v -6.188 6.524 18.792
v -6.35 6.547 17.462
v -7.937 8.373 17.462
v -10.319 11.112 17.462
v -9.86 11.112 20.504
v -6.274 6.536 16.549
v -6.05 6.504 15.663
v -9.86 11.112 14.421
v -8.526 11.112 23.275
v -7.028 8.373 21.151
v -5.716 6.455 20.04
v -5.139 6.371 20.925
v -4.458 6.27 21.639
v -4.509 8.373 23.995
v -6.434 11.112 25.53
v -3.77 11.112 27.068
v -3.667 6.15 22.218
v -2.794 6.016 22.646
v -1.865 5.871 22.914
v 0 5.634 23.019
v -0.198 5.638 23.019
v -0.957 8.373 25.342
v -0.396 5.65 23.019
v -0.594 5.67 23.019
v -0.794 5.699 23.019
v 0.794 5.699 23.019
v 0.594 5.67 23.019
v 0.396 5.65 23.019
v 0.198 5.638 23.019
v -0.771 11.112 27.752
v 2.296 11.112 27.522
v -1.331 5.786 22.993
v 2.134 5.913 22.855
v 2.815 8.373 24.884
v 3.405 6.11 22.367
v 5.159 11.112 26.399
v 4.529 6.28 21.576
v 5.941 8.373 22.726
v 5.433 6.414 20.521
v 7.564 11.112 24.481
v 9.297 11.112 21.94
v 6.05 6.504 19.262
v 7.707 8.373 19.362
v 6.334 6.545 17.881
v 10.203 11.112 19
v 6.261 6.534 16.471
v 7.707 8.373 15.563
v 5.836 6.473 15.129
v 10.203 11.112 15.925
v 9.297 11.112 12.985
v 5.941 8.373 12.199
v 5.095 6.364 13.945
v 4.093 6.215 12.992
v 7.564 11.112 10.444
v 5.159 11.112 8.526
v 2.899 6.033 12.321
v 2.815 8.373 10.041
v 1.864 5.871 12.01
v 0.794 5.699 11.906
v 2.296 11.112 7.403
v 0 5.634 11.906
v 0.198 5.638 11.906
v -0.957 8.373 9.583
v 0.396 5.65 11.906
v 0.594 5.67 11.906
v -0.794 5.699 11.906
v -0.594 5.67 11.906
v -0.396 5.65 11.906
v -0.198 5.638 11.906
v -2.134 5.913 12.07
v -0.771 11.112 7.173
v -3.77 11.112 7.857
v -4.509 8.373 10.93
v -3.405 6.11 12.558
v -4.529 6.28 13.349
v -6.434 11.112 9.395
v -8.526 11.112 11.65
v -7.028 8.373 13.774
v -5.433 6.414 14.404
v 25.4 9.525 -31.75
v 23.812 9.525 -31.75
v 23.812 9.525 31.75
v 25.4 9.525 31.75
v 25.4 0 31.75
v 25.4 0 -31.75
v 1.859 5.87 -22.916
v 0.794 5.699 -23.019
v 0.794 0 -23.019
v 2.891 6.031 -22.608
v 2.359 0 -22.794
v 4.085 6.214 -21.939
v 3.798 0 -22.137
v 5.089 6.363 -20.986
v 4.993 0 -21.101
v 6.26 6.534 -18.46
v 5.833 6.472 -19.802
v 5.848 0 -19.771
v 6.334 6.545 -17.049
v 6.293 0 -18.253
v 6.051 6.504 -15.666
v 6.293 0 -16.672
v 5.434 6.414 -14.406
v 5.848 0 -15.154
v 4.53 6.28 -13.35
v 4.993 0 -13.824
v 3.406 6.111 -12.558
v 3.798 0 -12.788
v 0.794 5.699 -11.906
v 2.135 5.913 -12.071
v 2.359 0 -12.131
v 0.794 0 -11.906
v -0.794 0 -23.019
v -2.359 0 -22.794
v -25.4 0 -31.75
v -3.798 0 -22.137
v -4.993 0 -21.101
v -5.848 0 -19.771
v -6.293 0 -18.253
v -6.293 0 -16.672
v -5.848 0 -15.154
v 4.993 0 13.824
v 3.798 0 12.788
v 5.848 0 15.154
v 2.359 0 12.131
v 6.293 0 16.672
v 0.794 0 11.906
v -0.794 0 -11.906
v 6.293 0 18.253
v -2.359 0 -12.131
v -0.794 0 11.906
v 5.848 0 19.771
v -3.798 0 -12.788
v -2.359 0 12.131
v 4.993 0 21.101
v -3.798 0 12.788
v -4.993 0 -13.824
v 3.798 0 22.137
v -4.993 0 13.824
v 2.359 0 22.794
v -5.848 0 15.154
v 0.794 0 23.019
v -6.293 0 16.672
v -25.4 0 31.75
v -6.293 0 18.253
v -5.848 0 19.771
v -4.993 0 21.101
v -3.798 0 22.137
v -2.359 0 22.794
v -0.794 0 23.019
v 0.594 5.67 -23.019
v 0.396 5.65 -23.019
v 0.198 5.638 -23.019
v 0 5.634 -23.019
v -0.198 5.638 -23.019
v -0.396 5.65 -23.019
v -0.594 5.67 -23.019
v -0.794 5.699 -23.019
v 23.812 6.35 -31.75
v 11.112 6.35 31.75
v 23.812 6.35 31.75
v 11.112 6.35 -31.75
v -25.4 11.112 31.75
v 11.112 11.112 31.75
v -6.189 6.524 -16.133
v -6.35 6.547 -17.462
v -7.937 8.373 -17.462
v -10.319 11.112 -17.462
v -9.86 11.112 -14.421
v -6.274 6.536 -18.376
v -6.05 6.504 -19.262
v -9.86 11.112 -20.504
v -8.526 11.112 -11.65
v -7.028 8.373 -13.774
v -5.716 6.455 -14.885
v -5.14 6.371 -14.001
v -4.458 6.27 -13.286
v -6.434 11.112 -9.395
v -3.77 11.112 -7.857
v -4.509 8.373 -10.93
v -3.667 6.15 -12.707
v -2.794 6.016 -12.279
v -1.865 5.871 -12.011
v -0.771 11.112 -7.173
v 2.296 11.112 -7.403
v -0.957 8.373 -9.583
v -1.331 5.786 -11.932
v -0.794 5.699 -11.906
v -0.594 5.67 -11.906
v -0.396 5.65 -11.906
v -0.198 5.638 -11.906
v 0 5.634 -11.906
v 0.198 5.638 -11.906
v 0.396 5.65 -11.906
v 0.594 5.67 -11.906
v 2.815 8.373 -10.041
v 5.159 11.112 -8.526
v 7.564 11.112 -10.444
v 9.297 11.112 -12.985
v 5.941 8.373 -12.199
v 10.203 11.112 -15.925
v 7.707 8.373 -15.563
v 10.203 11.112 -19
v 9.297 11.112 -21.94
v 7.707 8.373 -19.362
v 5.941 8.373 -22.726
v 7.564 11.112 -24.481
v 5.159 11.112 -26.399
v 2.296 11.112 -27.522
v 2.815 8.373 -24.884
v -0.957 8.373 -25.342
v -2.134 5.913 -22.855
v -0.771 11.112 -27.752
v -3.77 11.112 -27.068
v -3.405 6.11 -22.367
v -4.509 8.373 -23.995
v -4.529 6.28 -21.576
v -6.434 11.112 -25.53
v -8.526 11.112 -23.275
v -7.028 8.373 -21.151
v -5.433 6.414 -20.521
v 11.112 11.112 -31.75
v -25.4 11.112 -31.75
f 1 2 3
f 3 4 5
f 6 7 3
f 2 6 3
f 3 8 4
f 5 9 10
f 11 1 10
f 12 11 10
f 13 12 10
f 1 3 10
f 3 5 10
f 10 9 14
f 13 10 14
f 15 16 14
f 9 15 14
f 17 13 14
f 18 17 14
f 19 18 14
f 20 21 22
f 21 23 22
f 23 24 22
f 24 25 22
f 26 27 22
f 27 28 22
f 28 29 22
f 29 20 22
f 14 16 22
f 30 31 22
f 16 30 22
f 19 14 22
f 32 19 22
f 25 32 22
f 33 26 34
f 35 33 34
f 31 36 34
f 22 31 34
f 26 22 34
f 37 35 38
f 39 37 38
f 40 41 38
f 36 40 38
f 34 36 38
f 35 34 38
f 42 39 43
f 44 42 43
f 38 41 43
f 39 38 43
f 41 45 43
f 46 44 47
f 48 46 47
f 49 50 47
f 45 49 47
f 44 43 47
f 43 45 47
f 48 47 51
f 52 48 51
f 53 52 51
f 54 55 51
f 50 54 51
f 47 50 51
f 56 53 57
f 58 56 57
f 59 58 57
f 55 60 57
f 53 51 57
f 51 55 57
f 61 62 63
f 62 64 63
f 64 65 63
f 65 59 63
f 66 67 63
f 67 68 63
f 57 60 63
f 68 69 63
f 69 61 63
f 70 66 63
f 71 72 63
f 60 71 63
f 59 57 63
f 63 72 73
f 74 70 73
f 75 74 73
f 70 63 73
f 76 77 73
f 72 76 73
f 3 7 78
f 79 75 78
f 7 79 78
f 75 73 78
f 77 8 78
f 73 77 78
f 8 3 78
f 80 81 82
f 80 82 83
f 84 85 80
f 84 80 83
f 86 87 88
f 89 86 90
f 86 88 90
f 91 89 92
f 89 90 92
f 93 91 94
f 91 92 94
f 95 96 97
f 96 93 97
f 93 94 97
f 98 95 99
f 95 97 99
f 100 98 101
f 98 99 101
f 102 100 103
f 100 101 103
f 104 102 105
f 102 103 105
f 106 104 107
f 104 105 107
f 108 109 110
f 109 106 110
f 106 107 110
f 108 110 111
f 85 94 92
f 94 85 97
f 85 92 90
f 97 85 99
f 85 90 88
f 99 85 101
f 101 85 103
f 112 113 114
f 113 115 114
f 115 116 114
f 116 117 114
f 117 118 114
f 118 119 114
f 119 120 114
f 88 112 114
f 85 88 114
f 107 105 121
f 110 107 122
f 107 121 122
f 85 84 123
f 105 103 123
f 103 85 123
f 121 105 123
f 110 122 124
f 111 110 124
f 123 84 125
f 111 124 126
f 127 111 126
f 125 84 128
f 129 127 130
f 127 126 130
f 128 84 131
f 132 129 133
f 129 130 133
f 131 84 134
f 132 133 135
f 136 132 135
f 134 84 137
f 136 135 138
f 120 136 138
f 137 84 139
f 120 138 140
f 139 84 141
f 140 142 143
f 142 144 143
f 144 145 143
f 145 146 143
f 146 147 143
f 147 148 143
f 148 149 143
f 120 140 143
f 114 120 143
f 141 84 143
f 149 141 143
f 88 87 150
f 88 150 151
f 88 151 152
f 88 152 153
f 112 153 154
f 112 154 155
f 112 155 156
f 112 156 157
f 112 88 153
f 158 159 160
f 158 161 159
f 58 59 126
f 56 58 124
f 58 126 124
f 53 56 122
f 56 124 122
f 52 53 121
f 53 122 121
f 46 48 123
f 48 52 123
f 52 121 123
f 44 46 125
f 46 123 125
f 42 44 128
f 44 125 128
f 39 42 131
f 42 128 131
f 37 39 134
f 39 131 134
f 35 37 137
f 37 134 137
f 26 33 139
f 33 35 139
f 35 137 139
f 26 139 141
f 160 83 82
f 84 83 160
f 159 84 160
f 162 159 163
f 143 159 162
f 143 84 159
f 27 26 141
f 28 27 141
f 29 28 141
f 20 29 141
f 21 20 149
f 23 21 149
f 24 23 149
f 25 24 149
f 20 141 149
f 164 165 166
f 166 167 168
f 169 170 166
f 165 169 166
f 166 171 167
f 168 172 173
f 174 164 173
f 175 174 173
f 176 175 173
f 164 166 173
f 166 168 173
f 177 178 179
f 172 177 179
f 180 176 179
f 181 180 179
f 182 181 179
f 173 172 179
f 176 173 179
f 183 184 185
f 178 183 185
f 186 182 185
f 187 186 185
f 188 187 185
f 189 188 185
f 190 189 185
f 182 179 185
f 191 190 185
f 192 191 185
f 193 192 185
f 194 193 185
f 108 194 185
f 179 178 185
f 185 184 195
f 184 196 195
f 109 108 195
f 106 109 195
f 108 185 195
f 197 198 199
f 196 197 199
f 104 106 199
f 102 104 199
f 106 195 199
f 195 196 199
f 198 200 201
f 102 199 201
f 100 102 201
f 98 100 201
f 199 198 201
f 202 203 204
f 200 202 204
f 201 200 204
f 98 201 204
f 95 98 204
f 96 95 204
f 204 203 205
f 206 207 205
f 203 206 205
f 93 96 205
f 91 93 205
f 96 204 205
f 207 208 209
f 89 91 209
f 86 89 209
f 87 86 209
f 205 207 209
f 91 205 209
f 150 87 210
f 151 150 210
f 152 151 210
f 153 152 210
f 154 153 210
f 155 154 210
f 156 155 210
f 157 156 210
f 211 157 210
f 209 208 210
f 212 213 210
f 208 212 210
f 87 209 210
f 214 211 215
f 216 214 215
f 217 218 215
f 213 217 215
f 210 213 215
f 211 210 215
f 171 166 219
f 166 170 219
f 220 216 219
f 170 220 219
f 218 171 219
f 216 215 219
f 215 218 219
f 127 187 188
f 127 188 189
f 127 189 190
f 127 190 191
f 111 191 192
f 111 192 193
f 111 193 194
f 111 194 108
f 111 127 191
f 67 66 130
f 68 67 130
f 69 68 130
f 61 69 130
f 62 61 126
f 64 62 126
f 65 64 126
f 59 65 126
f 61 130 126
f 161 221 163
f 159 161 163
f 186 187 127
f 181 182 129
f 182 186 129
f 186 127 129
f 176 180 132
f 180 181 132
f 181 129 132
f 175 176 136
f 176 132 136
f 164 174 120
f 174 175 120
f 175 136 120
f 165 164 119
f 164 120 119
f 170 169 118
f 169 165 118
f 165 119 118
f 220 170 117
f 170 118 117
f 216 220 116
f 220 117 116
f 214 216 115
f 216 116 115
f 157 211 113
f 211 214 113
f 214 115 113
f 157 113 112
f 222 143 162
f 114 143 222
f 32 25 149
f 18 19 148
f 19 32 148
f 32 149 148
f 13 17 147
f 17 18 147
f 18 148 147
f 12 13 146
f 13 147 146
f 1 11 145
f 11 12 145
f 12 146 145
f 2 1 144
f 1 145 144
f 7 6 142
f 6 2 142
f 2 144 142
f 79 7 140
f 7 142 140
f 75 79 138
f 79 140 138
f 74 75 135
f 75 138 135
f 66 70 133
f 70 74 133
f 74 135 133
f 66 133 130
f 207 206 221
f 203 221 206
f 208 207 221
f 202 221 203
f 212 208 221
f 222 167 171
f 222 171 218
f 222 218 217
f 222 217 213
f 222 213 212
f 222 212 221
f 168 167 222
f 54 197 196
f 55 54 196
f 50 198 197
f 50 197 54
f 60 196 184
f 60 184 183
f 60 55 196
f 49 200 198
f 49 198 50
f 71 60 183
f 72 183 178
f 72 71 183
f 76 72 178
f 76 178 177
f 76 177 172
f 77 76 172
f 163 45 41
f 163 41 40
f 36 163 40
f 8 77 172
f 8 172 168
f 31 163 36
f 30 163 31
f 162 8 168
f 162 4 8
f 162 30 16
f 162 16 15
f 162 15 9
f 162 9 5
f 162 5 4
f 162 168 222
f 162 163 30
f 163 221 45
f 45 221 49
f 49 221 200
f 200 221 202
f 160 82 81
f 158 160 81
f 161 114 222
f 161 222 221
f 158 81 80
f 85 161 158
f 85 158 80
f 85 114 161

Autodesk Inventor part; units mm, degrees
ref_plane "YZ Plane" through (0, 0, 0) normal (1, 0, 0) x (0, 1, 0)
ref_plane "XZ Plane" through (0, 0, 0) normal (0, 1, 0) x (-1, 0, 0)
ref_plane "XY Plane" through (0, 0, 0) normal (0, 0, 1) x (1, 0, 0)
sketch "Sketch1" plane through (0, 0, 0) normal (0, 1, 0) x (-1, 0, 0)
  line L0 (-25.4, 31.75) -> (25.4, 31.75)
  line L1 (25.4, 31.75) -> (25.4, -31.75)
  line L2 (25.4, -31.75) -> (-25.4, -31.75)
  line L3 (-25.4, -31.75) -> (-25.4, 31.75)
  line L4 (-25.4, 31.75) -> (25.4, -31.75) construction
  line L5 (25.4, 31.75) -> (-25.4, -31.75) construction
  line L6 (0, 31.75) -> (0, -31.75) construction
  line L7 (-0.7937, -17.4625) -> (0.7938, -17.4625) construction
  line L8 (-0.7937, -23.0187) -> (0.7938, -23.0187)
  line L9 (0.7938, -11.9063) -> (-0.7937, -11.9063)
  arc A0 (-0.7937, -11.9063) -> (-0.7937, -23.0187) centre (-0.7937, -17.4625) ccw
  arc A1 (0.7938, -23.0187) -> (0.7938, -11.9063) centre (0.7938, -17.4625) ccw
  line L10 (25.4, 0) -> (-25.4, 0) construction
  line L11 (-0.7937, 17.4625) -> (0.7937, 17.4625) construction
  line L12 (-0.7938, 23.0187) -> (0.7937, 23.0187)
  line L13 (0.7938, 11.9063) -> (-0.7937, 11.9063)
  arc A2 (-0.7938, 23.0187) -> (-0.7937, 11.9063) centre (-0.7937, 17.4625) ccw
  arc A3 (0.7938, 11.9063) -> (0.7937, 23.0187) centre (0.7937, 17.4625) ccw
  circle A4 centre (0, 17.4625) radius 5.5562
  circle A5 centre (0, -17.4625) radius 5.5562
  point P0 (0, 0)
  point P1 (0, 0)
  point P2 (0, -11.9063)
  point P3 (0, -23.0187)
  point P4 (0, 11.9063)
  point P5 (0, 23.0187)
  dimension "d0" = 50.8
  dimension "d1" = 63.5
  dimension "d2" = 0.7937
  dimension "d3" = 11.1125
  dimension "d4" = 17.4625
extrude "Extrusion1" add sketch "Sketch1" along normal blind 11.1125 contours L0 L1 L2 L3 | A0 L9 A5 L8 | A5 L9 A1 L8 | L12 A4 L13 A2 | L12 A3 L13 A4
sketch "Sketch2" plane through (0, 11.1125, 0) normal (0, 1, 0) x (1, 0, 0)
  line L0 (25.4, 31.75) -> (-25.4, 31.75) projected
  line L1 (-25.4, -31.75) -> (25.4, -31.75) projected
  line L2 (23.8125, 31.75) -> (11.1125, 31.75)
  line L3 (11.1125, 31.75) -> (11.1125, -31.75)
  line L4 (11.1125, -31.75) -> (23.8125, -31.75)
  line L5 (23.8125, -31.75) -> (23.8125, 31.75)
  line L6 (25.4, -31.75) -> (25.4, 31.75) projected
  point P0 (0, 0)
  point P1 (23.8125, -31.75)
  dimension "d7" = 12.7
  dimension "d8" = 1.5875
extrude "Extrusion3" cut sketch "Sketch2" against normal blind 1.5875 contours L6 L1 L5 L0
chamfer "Chamfer1" distance 4.7625 angle 49 2 edges at (0, 11.1125, 23.0188) (0, 11.1125, -23.0188) measured on face at (-18.6651, 11.1125, -5.1641)
extrude "Extrusion4" cut sketch "Sketch2" against normal blind 4.7625 contours L5 L1 L3 L0
extrude "Extrusion5" cut sketch "Sketch1" along normal blind 7.9375 contours A0 L9 A5 L8 | A5 L9 A1 L8 | A5 | L12 A4 L13 A2 | L12 A3 L13 A4 | A4
properties part number "Jaw" material "Aluminum 6061"
